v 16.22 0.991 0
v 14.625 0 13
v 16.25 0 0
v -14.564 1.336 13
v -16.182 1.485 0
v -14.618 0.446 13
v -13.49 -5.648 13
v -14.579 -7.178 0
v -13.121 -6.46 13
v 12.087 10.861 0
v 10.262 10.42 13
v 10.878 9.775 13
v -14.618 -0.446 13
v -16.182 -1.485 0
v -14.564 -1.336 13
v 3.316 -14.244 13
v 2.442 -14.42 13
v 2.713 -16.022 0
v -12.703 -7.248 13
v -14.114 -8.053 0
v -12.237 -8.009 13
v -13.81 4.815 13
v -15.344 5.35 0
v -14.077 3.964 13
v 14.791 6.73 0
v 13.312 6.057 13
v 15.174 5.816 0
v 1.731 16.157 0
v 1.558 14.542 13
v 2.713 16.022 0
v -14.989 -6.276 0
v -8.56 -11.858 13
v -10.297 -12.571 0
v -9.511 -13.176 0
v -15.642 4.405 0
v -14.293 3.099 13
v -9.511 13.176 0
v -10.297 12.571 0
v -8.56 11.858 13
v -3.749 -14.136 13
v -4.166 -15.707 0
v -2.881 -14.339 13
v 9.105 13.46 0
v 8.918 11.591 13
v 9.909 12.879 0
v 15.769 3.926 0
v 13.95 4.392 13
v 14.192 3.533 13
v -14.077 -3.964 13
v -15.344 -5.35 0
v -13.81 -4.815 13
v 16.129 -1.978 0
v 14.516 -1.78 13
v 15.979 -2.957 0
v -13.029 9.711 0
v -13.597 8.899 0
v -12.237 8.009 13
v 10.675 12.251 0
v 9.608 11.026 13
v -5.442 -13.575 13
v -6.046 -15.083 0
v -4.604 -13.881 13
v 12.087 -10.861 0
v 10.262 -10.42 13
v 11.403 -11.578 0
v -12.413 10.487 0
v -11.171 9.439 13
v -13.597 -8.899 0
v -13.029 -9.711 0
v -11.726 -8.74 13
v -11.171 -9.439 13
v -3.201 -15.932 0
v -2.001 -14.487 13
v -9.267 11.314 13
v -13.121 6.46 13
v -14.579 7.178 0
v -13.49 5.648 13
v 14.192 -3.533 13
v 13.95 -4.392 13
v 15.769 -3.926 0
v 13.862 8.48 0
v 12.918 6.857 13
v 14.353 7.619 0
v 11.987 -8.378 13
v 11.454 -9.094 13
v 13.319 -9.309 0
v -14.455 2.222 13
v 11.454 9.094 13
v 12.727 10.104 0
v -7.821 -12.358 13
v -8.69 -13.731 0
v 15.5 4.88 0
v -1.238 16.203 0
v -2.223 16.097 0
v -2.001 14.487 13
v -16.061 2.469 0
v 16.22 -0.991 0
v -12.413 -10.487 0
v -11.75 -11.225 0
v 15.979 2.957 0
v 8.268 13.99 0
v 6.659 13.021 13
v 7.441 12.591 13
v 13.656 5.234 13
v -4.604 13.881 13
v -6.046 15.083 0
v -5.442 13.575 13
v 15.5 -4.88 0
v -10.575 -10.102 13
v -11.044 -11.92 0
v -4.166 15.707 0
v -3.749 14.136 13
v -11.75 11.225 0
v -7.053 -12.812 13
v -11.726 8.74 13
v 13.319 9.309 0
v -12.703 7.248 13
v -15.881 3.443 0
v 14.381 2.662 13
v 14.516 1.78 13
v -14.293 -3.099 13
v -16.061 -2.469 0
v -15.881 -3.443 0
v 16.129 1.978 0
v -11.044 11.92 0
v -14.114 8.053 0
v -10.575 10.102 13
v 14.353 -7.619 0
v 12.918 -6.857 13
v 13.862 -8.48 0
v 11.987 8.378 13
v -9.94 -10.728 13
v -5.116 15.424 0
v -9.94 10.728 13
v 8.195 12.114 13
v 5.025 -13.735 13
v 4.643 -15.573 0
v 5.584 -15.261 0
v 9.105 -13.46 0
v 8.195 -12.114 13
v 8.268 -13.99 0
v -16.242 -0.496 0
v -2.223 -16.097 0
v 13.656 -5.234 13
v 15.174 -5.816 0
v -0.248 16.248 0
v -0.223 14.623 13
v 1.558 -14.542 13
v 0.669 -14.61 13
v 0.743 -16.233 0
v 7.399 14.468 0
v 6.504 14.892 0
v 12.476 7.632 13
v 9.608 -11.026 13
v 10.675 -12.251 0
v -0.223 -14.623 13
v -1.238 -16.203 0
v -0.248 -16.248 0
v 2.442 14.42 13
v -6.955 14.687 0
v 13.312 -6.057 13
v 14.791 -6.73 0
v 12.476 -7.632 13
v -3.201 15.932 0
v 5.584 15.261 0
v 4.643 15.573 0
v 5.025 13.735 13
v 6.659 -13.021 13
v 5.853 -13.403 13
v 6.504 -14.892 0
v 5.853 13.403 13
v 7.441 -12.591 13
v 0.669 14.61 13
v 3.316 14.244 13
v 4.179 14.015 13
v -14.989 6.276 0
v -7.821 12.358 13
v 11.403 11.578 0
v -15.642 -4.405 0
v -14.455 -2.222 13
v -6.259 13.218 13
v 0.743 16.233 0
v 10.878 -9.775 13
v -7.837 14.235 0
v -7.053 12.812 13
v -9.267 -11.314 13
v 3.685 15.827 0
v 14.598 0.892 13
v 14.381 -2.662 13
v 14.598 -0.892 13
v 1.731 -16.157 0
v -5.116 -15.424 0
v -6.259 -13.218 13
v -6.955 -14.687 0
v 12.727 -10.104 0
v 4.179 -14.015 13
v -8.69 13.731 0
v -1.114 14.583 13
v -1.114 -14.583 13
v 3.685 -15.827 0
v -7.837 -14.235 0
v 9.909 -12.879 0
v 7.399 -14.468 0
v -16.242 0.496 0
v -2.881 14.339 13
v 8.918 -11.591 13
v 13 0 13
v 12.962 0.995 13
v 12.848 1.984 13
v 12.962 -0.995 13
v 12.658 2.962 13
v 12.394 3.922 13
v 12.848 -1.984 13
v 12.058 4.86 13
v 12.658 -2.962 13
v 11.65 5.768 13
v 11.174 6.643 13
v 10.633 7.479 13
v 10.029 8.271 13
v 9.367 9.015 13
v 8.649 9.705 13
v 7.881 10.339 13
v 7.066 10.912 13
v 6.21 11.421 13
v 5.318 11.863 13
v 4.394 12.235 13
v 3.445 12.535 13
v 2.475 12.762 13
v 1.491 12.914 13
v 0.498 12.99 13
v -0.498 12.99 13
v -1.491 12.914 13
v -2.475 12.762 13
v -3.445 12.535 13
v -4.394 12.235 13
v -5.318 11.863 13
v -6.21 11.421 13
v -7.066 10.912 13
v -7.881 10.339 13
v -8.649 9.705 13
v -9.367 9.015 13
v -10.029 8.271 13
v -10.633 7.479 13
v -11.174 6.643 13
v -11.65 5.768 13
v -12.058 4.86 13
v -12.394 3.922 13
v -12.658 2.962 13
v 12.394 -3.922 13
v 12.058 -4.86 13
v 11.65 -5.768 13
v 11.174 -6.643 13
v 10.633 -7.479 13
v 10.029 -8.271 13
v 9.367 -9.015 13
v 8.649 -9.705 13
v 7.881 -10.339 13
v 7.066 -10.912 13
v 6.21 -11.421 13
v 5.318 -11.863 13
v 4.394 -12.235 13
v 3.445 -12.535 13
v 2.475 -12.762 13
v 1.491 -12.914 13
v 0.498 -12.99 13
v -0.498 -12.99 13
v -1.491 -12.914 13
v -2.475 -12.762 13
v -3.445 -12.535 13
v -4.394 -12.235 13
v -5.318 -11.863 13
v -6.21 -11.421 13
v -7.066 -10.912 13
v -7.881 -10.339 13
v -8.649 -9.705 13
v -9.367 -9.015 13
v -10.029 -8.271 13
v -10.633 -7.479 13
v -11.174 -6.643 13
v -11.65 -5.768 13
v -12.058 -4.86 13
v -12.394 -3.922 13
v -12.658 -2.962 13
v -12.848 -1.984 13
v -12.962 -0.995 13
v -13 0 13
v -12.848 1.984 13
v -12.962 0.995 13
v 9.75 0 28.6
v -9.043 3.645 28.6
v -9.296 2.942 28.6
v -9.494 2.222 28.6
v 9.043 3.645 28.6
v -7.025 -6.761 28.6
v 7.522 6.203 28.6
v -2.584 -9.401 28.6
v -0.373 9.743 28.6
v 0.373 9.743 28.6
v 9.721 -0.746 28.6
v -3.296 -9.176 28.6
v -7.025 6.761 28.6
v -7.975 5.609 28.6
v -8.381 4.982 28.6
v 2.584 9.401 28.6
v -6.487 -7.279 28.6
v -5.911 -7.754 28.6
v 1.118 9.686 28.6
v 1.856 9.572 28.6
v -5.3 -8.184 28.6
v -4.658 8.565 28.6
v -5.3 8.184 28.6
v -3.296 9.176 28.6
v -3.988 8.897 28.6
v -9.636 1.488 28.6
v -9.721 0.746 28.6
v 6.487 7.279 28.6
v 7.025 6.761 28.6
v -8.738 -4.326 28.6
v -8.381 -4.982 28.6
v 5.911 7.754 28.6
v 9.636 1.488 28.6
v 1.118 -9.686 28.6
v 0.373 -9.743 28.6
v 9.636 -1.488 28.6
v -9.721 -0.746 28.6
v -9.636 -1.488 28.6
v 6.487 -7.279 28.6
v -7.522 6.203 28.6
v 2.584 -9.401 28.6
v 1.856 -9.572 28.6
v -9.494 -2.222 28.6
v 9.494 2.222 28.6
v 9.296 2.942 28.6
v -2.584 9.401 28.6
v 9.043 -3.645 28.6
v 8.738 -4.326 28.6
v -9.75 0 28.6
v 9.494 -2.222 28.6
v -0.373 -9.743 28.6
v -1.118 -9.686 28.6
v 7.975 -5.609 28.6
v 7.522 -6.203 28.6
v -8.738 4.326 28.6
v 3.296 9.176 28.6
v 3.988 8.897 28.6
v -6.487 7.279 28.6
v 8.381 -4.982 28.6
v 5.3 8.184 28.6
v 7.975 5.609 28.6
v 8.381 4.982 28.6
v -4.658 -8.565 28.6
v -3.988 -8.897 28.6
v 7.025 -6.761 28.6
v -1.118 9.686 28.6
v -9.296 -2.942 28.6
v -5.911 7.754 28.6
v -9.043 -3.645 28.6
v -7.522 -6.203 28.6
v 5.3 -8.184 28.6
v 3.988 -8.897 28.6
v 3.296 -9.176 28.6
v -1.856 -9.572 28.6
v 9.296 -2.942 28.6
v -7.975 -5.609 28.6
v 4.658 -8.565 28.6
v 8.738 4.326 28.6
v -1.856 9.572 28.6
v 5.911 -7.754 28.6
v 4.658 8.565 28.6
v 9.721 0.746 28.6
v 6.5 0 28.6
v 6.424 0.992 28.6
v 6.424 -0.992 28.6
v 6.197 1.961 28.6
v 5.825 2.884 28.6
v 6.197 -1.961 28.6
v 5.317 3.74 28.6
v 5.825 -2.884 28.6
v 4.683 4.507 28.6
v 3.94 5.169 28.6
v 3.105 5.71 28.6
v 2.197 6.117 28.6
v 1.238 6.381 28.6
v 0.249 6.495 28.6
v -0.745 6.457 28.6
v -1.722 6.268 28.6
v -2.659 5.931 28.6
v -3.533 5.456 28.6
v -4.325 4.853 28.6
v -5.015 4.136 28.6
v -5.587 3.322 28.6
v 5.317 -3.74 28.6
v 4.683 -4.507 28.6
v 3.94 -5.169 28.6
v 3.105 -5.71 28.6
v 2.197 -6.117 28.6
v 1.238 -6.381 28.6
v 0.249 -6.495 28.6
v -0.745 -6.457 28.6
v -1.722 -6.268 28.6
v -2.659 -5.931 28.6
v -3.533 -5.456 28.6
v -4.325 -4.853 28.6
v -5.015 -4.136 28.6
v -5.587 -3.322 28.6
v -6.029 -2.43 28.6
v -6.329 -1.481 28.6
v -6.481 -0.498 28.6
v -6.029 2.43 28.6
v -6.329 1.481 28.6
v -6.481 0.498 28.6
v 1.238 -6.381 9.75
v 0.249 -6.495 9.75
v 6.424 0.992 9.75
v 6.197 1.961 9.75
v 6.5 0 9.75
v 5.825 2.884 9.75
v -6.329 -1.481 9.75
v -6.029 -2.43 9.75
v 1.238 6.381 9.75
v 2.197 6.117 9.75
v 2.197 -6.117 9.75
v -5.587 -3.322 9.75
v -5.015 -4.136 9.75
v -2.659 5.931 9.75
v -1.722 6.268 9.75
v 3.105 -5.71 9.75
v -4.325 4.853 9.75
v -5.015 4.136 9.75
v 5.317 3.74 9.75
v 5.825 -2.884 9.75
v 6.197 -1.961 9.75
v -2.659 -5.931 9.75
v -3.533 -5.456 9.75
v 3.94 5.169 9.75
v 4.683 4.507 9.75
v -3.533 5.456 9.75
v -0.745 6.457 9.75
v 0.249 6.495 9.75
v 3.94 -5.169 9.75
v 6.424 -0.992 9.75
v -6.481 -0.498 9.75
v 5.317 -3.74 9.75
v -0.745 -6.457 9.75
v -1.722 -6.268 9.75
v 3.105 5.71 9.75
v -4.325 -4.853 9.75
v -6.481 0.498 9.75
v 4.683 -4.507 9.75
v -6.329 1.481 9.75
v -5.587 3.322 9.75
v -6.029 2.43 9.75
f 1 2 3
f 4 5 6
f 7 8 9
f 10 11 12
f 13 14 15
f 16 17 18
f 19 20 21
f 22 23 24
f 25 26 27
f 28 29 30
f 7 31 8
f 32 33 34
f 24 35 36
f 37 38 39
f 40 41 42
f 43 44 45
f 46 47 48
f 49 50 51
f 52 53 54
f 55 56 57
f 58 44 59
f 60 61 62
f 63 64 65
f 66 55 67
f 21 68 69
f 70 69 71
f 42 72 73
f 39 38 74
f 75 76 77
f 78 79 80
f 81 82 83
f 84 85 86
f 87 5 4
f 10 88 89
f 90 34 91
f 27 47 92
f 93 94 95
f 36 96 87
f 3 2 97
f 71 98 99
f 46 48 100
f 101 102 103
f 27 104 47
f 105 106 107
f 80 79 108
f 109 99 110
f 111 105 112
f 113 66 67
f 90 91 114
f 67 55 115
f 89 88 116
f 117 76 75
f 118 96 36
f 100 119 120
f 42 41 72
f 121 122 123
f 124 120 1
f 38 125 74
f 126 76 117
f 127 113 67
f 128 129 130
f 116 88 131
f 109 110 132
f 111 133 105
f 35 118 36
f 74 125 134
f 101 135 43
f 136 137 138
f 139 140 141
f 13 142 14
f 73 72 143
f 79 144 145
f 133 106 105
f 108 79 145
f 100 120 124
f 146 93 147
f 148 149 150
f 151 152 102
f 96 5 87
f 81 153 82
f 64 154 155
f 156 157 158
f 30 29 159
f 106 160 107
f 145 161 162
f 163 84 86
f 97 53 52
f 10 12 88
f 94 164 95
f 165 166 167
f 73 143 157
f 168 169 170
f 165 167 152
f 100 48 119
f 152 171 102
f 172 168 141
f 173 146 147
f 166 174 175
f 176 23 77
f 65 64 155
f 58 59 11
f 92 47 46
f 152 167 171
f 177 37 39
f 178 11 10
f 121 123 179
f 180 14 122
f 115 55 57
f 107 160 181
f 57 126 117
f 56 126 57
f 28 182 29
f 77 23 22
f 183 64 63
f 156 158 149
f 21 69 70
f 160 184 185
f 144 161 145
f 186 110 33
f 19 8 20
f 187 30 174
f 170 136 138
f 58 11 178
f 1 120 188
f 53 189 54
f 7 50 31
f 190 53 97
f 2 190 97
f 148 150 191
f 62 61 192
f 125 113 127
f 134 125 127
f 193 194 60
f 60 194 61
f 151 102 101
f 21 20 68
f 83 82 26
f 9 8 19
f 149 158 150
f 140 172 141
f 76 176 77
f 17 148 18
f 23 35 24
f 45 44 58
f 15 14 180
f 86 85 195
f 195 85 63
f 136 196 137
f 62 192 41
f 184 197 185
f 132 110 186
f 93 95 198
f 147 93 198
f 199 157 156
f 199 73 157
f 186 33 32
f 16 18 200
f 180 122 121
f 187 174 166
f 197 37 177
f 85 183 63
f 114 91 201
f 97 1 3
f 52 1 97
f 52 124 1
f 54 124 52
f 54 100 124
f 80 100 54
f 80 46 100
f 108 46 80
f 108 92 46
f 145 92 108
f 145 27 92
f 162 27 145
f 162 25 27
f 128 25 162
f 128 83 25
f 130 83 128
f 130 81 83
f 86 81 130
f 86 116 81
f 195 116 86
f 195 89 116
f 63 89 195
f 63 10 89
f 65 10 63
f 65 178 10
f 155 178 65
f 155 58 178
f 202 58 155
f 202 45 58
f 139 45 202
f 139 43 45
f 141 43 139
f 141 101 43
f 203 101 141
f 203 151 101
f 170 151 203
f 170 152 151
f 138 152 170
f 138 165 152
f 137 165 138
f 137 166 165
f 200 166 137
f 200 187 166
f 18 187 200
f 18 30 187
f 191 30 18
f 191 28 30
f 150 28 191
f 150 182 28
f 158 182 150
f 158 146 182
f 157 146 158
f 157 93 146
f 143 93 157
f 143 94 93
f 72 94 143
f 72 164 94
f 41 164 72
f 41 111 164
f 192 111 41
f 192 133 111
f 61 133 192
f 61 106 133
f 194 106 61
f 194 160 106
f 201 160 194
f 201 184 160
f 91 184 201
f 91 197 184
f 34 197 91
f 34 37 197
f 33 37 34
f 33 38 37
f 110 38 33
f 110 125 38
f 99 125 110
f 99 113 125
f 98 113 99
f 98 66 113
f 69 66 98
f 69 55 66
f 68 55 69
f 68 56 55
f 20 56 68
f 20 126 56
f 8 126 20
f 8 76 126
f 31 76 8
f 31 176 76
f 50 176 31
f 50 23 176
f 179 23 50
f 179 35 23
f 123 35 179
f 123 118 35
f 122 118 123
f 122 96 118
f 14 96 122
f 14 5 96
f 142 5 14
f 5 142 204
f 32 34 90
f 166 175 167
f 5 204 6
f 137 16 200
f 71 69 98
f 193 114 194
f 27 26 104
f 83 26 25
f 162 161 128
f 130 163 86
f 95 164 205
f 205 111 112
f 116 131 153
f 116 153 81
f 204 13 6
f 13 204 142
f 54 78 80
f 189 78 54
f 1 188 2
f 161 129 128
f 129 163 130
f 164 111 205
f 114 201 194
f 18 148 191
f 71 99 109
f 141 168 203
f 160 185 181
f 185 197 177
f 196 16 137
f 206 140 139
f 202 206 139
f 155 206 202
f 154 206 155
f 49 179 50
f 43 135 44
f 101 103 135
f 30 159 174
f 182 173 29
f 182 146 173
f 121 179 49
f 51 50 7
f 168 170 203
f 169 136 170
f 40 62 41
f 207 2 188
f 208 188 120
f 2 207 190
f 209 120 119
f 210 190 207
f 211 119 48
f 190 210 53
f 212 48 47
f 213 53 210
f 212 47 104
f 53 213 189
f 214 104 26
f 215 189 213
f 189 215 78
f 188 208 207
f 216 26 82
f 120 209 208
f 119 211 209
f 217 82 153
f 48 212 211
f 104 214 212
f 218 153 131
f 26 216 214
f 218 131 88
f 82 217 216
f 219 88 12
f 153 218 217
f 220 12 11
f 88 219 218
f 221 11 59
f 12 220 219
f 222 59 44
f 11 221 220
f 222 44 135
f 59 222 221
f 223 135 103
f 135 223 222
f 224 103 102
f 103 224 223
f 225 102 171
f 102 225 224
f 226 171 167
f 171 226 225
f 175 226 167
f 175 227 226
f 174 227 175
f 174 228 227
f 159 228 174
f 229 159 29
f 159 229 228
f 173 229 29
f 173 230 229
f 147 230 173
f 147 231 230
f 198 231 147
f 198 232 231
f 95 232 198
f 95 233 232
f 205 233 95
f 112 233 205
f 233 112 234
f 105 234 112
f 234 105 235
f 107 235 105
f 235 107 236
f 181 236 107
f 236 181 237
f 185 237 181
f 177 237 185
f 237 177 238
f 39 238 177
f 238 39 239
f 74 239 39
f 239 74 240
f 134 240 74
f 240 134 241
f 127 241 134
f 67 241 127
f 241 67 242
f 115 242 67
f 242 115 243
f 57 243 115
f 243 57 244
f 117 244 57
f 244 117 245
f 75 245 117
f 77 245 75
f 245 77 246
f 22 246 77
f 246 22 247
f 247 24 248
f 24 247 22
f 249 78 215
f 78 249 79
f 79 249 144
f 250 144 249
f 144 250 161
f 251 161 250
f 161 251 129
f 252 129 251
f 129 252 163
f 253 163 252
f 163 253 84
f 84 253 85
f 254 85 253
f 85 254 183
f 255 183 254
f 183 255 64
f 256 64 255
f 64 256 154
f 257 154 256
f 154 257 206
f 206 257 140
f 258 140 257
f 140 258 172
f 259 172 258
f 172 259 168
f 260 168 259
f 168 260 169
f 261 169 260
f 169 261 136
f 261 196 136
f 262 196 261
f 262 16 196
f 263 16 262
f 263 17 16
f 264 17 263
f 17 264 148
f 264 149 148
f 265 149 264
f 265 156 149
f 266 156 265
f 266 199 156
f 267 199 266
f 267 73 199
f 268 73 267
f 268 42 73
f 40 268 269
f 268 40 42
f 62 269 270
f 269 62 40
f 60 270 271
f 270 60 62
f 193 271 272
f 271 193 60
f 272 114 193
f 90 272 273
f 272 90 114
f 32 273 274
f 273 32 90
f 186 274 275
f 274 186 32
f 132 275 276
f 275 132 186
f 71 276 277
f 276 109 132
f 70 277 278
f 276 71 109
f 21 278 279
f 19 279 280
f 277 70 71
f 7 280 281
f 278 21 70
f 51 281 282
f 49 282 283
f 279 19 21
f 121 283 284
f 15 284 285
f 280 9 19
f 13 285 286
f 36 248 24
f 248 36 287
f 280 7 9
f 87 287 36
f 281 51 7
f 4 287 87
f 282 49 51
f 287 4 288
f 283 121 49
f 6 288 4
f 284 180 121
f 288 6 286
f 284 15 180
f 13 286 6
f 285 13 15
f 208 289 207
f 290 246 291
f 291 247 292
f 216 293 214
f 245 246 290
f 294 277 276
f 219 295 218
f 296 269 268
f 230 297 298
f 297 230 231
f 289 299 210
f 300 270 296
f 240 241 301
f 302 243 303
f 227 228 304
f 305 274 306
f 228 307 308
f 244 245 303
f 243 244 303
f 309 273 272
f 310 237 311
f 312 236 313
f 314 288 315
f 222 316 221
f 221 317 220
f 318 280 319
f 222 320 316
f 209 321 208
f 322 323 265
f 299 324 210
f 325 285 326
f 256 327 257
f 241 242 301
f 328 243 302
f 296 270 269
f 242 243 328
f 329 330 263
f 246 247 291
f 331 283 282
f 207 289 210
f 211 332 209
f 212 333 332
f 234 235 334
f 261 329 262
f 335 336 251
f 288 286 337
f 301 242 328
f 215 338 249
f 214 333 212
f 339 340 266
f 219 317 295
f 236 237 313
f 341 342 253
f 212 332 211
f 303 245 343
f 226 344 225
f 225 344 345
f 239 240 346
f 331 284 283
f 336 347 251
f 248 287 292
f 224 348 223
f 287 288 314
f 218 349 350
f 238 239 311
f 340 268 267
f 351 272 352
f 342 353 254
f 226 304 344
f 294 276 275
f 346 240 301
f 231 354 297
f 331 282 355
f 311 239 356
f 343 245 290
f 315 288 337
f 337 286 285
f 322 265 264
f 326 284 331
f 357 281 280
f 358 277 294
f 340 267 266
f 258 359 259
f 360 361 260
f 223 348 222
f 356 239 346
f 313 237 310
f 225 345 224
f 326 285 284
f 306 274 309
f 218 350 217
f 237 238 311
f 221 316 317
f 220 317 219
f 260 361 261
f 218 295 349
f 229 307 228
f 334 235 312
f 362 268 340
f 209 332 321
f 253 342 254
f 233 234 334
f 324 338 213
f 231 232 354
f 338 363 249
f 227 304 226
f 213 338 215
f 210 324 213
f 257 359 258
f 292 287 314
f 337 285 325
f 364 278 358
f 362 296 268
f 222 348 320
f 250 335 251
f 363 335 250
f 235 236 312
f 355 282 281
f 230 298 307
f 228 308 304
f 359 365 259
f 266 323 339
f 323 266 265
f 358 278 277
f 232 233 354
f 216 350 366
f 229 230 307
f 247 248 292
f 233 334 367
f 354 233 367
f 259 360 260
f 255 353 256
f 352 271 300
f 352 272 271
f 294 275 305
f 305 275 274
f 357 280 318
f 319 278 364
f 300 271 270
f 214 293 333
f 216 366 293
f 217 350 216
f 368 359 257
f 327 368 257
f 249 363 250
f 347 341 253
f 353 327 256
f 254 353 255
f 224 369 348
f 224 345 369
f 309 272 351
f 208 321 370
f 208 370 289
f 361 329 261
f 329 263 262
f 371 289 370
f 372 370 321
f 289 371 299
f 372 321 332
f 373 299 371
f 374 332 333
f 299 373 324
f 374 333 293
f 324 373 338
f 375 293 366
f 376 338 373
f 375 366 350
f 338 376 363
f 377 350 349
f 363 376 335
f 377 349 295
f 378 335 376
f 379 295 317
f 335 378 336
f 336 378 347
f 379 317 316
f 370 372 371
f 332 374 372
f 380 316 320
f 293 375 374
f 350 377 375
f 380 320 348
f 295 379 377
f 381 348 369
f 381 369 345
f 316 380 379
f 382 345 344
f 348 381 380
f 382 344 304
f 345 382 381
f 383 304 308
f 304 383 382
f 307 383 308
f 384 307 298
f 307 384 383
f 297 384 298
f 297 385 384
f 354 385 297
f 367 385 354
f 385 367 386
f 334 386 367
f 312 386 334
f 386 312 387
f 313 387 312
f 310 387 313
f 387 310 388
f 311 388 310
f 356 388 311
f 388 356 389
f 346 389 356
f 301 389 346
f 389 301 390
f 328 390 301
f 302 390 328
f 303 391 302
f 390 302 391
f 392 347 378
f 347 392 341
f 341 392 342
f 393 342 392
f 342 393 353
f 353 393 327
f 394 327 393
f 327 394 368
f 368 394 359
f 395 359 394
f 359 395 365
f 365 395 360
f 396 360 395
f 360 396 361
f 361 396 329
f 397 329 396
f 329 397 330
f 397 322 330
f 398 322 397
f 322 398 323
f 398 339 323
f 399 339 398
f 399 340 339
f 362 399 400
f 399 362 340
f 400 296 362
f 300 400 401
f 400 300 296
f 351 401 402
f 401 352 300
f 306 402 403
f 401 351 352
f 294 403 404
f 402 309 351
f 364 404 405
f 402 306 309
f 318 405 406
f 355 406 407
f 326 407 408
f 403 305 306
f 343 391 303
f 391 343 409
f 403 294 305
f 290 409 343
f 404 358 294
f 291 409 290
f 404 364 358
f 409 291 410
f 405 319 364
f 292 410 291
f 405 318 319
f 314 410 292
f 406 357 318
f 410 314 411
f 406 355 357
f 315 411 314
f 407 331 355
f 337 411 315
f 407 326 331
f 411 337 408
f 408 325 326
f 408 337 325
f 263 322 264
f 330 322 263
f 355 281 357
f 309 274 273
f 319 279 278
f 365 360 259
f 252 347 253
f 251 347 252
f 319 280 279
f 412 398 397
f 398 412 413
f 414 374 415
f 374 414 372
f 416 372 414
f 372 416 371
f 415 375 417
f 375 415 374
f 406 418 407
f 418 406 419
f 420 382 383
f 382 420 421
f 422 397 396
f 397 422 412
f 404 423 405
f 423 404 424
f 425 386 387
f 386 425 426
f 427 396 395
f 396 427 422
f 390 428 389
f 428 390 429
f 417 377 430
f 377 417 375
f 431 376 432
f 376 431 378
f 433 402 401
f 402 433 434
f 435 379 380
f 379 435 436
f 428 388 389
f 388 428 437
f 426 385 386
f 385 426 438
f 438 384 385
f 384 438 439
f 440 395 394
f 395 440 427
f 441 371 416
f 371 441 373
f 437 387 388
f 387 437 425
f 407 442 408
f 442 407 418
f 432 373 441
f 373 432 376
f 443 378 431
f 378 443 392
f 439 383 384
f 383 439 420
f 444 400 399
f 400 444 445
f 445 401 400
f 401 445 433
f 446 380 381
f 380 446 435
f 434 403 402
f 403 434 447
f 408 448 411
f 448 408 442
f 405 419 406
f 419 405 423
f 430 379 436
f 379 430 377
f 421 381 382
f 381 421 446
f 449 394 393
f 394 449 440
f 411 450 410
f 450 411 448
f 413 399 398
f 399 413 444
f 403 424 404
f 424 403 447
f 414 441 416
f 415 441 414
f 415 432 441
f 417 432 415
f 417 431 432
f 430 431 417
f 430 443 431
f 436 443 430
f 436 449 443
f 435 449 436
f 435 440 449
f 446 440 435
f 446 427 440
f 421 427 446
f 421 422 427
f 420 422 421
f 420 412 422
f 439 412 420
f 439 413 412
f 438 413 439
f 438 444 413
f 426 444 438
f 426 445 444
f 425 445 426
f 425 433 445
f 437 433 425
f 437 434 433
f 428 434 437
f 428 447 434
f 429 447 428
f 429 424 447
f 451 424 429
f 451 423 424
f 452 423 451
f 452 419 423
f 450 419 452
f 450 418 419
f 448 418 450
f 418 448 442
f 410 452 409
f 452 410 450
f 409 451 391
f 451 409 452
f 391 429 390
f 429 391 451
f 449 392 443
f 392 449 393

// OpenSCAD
$fa = 1;
$fs = 1;
Diameter = 13;

Height = 2.2 * Diameter;
Top = 1.5 * Diameter;
Bottom = 2.5 * Diameter;
Shoulder = 2 * Diameter;
Base = 0.75 * Diameter;

difference() {
  union() {
    cylinder(h=Diameter, d1=Bottom, d2=(Bottom+Shoulder)/2);
    translate([0,0,Diameter]) {
      cylinder(h=Height-Diameter, d1=Shoulder, d2=Top);
    }
  }
  translate([0,0,Base]) {
    cylinder(h=Height-Base, d=Diameter);
  }
}
